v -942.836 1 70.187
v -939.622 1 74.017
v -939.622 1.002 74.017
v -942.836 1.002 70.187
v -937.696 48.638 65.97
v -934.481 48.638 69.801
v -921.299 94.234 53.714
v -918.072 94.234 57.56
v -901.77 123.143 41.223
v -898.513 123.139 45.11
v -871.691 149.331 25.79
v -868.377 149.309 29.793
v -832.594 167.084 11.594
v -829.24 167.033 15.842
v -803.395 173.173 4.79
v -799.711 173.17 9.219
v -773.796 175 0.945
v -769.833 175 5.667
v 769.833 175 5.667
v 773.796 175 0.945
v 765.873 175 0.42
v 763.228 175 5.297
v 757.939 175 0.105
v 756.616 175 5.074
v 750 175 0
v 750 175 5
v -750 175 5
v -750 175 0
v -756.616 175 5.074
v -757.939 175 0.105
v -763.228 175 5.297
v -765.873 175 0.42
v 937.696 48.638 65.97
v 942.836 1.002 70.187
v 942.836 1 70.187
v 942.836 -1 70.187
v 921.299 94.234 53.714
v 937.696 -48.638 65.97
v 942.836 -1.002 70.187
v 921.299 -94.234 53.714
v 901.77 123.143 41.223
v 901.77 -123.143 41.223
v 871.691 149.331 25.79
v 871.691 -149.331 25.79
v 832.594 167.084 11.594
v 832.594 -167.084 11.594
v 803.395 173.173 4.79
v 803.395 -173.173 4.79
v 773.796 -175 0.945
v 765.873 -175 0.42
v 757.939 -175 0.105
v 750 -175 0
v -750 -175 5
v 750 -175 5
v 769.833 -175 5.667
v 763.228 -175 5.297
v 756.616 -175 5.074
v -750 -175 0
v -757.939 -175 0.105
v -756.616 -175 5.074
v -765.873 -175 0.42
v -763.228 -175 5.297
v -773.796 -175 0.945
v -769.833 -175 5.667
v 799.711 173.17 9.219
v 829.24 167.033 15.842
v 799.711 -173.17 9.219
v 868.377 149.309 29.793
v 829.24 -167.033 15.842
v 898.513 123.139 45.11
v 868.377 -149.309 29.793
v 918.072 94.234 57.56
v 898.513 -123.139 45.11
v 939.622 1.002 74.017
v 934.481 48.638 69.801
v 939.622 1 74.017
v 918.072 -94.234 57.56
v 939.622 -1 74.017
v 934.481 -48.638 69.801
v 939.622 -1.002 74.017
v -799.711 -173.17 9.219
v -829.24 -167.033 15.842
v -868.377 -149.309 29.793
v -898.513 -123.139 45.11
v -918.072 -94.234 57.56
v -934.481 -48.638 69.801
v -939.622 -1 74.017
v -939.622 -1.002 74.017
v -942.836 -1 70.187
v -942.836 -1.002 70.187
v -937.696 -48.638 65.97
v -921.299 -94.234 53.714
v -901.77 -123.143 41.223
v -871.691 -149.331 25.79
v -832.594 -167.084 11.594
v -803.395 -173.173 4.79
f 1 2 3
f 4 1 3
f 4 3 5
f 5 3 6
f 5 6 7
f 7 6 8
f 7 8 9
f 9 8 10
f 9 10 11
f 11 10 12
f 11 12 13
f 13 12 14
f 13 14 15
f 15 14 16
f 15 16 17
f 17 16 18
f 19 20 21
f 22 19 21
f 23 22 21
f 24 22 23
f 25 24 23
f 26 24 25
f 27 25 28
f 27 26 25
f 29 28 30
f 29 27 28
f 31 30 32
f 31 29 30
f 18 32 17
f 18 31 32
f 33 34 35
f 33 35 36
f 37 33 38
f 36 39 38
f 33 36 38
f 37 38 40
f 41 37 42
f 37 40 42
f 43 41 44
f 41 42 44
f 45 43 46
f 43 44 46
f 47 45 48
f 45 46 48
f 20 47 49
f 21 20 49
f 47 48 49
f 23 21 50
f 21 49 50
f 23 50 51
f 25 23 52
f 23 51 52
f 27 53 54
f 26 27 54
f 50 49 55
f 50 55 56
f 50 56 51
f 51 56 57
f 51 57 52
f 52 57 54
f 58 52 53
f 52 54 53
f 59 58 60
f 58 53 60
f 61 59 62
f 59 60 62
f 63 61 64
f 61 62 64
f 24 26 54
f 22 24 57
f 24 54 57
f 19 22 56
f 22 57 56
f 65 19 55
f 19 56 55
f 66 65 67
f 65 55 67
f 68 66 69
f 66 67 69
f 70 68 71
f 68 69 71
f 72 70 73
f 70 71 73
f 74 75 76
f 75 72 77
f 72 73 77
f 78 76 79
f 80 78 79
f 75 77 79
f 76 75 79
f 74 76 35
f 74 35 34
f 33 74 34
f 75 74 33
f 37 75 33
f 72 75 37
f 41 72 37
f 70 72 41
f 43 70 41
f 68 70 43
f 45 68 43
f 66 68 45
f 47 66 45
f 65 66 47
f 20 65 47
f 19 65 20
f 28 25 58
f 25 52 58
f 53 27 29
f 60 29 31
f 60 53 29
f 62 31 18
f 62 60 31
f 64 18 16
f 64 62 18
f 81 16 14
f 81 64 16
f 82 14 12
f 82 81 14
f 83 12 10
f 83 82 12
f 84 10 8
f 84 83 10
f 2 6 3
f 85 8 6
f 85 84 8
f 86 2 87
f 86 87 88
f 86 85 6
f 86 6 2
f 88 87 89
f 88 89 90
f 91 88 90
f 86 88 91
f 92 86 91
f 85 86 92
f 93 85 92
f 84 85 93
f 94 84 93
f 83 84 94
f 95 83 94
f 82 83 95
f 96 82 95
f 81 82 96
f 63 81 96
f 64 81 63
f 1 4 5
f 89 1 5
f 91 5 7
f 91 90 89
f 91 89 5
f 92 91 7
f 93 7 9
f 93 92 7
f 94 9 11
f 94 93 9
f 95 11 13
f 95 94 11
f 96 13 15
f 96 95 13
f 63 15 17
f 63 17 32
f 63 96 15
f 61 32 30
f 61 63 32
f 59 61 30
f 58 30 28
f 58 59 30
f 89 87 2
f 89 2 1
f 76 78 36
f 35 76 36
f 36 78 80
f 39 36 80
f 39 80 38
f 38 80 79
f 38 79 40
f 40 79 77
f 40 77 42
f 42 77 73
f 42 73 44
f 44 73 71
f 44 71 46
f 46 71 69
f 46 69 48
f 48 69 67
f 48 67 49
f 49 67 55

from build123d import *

# Parameters (mm, degrees)
F1_DEPTH    = 175
F2_T1_DEPTH = 875


# Not quite as in the source:
# - a fillet or chamfer that OpenCascade refuses, or shapes differently, is made with other operations: its cross-section is extruded or revolved along the edge and cut away or added


with BuildPart() as f1:
    # F0 (on Front) → F1 (new body, symmetric)
    with BuildSketch(Plane.XZ):
        with BuildLine():
            Line((-750, 0), (0, 0))
            Line((0, 0), (0, 5))
            Line((0, 5), (-750, 5))
            ThreePointArc((-750, 5), (-850.8959422811, 22.7906768682), (-939.6223448575, 74.0168892799))
            Line((-939.6223448575, 74.0168892799), (-942.836282906, 70.1866670643))
            ThreePointArc((-942.836282906, 70.1866670643), (-852.6060429977, 18.0922137642), (-750, 0))
        make_face()
    extrude(amount=F1_DEPTH, both=True)

    # F2: fillet of radius 174 on 2 edges, made by hand

    # F2_s2 → F2_t1 (cut)
    with BuildSketch(Plane(origin=(-72.170505067, 0, -86.0094586929), x_dir=(0, 1, 0), z_dir=(-0.6427876097, 0, -0.7660444431))):
        with BuildLine():
            ThreePointArc((-1, -767.3696152452), (-124.0365799265, -716.4061951717), (-175, -593.3696152452))
            Line((-175, -593.3696152452), (-175, -767.3696152452))
            Line((-175, -767.3696152452), (-1, -767.3696152452))
        make_face()
        with BuildLine():
            ThreePointArc((1, -767.3696152452), (124.0365799265, -716.4061951717), (175, -593.3696152452))
            Line((175, -593.3696152452), (175, -767.3696152452))
            Line((175, -767.3696152452), (1, -767.3696152452))
        make_face()
    extrude(amount=F2_T1_DEPTH, mode=Mode.SUBTRACT)

    # F3: F1 across plane


with BuildPart() as f1_1:
    add(f1.part)
    add(f1.part.mirror(Plane.YZ))


solid = f1_1.part
